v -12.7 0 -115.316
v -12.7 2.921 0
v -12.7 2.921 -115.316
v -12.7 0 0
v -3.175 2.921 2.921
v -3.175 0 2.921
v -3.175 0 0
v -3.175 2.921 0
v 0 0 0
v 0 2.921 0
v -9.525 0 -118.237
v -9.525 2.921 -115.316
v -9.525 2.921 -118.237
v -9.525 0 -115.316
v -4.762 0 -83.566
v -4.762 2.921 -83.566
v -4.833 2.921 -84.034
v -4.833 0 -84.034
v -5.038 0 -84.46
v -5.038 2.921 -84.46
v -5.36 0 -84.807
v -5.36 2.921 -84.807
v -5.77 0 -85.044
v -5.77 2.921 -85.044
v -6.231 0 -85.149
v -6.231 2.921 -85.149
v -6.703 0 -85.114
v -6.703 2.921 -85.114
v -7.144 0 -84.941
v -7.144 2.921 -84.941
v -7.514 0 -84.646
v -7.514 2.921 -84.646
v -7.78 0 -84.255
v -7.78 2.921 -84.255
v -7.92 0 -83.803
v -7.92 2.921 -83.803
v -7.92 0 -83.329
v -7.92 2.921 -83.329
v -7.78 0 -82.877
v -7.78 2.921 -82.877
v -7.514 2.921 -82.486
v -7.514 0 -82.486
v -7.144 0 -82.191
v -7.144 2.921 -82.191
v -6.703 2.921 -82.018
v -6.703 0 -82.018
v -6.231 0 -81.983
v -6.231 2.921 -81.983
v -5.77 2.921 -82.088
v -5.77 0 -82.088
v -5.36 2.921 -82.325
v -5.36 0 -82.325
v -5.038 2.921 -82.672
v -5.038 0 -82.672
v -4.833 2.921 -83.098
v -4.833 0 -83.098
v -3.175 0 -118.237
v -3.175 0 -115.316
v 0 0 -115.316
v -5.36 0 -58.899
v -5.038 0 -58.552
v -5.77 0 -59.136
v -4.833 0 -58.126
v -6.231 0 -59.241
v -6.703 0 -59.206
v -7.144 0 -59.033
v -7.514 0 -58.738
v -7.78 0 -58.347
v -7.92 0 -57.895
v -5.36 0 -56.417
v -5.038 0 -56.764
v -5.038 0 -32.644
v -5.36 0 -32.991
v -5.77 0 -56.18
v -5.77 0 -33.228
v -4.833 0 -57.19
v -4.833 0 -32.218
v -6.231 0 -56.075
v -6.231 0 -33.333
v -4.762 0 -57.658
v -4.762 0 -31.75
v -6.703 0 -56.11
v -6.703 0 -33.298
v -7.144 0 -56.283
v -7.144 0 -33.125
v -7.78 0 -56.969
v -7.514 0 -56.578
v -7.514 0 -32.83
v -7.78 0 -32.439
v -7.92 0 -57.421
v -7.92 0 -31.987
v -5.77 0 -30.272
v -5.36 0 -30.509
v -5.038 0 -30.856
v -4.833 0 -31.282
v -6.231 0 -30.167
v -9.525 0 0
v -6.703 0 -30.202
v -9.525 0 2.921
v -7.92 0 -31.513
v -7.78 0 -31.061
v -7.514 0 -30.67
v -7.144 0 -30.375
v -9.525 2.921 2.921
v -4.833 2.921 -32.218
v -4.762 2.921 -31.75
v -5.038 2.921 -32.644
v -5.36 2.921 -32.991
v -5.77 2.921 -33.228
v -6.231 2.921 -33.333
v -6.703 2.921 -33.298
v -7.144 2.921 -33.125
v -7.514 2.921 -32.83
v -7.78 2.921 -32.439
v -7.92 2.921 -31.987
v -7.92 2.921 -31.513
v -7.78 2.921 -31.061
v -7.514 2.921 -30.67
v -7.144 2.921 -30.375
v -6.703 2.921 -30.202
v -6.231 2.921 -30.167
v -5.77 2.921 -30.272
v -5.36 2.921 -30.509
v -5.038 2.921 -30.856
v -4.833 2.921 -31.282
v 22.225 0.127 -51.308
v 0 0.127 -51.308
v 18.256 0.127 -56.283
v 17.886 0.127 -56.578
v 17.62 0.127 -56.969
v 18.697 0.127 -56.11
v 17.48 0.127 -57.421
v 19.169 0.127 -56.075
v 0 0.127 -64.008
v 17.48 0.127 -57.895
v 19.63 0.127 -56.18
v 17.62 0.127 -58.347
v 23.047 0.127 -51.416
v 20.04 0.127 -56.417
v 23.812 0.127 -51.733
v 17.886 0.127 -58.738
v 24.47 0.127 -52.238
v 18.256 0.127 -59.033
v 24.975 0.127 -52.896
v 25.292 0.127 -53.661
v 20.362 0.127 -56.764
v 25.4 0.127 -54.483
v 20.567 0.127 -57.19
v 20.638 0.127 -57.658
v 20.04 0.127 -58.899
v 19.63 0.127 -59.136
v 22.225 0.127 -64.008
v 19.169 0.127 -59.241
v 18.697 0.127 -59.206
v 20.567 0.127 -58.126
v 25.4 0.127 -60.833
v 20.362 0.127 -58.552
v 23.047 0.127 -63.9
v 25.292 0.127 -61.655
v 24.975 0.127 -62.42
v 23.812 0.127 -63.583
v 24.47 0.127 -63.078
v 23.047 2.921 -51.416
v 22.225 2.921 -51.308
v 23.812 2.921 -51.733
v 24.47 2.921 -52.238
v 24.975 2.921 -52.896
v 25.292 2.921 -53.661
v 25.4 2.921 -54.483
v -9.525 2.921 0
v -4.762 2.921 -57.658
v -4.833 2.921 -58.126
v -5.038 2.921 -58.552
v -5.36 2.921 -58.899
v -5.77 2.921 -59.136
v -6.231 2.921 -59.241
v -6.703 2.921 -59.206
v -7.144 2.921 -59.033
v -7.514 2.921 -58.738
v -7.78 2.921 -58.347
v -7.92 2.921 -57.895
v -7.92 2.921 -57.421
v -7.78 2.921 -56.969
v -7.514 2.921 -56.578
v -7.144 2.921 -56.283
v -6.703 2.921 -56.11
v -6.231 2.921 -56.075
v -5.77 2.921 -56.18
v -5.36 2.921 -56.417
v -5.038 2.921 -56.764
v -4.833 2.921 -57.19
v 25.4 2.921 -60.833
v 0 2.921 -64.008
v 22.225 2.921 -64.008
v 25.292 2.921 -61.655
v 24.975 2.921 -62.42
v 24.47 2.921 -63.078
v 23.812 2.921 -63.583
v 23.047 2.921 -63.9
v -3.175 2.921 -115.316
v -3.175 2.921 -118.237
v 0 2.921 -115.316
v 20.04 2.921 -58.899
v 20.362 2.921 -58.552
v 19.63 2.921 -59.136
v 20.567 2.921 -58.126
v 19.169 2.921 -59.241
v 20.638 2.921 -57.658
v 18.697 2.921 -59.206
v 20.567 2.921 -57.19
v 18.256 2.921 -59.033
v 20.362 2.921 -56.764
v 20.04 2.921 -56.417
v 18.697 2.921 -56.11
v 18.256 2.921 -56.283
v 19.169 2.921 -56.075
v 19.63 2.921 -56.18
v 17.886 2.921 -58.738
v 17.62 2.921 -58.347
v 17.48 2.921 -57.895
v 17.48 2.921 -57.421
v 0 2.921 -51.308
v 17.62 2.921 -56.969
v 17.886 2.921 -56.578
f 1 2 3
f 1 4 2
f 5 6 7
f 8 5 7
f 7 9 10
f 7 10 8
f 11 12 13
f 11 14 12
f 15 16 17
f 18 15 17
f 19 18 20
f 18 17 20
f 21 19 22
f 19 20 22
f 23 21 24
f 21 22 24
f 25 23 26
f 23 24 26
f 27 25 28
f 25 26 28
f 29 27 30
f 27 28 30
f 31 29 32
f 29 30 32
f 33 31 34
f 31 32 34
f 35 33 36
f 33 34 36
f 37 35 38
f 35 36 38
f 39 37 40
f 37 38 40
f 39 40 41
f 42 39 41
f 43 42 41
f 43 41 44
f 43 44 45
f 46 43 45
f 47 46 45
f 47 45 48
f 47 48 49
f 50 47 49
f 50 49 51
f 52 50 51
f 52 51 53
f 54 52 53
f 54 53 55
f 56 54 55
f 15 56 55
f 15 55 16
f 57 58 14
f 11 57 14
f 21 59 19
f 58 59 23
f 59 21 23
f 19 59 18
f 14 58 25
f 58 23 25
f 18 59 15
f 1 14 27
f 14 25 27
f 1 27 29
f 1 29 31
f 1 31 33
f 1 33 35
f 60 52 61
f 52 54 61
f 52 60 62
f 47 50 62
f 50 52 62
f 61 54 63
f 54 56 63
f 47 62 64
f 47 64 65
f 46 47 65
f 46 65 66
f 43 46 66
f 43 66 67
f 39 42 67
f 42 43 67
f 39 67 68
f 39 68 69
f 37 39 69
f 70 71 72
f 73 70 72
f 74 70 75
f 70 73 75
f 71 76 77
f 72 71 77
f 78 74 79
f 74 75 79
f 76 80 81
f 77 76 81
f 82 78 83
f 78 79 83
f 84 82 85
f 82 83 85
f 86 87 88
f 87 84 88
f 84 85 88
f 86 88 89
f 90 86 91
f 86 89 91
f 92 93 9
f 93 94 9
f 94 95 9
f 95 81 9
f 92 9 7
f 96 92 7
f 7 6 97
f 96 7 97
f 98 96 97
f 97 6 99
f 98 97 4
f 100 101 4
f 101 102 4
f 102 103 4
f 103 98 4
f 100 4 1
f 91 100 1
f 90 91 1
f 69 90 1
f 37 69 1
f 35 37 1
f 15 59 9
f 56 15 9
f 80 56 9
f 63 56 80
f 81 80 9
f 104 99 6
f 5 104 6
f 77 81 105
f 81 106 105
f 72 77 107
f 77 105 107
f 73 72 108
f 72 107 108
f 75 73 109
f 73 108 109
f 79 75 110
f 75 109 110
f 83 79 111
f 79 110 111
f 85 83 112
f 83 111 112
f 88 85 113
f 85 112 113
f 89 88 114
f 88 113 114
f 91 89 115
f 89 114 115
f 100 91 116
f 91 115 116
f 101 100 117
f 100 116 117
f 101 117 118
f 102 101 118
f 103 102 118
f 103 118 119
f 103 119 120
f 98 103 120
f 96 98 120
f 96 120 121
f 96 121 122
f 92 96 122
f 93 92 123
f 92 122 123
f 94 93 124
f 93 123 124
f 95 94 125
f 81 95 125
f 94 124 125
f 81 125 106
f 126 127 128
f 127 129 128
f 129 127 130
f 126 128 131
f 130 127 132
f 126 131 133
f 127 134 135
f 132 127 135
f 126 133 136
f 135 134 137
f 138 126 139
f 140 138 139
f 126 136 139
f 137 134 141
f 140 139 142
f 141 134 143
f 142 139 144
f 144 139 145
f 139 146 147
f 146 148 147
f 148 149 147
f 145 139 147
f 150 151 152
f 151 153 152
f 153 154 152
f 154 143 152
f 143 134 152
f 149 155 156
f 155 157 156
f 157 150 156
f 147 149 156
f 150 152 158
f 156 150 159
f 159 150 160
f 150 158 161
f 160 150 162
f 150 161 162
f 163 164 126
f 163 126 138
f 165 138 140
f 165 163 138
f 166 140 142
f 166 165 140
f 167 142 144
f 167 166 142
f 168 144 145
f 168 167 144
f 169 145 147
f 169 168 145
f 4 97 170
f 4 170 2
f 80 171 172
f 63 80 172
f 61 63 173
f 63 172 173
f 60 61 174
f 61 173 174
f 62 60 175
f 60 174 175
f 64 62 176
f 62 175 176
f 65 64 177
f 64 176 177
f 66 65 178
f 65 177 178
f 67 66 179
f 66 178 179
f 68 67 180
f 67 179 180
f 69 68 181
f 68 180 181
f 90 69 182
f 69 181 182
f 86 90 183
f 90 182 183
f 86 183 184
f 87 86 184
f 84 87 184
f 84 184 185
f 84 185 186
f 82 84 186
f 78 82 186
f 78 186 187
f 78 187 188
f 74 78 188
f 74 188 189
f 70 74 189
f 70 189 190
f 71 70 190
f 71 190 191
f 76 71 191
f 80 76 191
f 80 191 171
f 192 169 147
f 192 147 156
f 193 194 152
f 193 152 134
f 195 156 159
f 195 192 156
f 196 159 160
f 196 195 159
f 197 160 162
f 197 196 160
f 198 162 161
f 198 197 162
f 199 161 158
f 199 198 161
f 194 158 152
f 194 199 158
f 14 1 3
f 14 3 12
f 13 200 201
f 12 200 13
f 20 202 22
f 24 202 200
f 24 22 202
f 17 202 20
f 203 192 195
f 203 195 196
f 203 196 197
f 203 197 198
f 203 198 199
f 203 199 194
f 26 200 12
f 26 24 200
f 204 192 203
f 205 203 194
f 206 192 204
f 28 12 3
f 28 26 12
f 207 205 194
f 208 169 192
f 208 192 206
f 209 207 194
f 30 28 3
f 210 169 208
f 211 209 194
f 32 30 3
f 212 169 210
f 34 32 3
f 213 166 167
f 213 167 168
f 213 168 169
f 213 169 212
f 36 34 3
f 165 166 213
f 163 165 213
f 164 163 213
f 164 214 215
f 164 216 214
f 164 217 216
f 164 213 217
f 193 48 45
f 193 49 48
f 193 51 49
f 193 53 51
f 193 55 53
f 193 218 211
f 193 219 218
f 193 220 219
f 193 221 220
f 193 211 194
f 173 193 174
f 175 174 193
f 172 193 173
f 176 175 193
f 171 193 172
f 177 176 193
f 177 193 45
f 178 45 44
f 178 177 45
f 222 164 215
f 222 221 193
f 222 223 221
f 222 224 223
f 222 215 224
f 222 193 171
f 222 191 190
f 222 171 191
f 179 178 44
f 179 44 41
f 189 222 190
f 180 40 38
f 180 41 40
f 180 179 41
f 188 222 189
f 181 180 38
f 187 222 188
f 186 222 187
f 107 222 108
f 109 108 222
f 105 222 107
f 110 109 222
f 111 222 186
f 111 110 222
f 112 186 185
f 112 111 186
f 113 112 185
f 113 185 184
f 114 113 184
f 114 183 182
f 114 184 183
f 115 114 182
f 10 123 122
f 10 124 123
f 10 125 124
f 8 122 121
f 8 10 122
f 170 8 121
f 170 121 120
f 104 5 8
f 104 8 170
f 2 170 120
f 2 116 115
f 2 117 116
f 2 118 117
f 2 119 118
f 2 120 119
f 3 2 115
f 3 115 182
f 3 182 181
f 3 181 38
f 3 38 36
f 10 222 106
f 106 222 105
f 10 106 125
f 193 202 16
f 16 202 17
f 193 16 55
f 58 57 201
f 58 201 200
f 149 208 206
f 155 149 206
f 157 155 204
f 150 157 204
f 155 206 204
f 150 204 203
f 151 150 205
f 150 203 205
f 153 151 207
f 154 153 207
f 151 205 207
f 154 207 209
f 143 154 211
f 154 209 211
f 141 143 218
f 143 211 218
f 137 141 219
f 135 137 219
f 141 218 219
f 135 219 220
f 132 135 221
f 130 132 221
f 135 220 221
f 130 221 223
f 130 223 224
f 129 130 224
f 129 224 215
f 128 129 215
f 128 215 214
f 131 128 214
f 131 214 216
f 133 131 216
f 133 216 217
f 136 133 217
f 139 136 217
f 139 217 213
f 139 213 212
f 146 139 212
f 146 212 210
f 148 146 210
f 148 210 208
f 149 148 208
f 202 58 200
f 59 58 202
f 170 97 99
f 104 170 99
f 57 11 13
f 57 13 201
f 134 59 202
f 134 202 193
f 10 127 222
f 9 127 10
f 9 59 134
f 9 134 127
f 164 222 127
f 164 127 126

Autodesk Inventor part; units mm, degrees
ref_plane "YZ Plane" through (0, 0, 0) normal (1, 0, 0) x (0, 1, 0)
ref_plane "XZ Plane" through (0, 0, 0) normal (0, 1, 0) x (-1, 0, 0)
ref_plane "XY Plane" through (0, 0, 0) normal (0, 0, 1) x (1, 0, 0)
sketch "Sketch1" plane through (0, 0, 0) normal (0, 1, 0) x (-1, 0, 0)
  line L0 (0, 0) -> (12.7, 0)
  line L1 (12.7, 0) -> (12.7, -115.316)
  line L2 (12.7, -115.316) -> (0, -115.316)
  line L3 (0, -115.316) -> (0, 0)
  line L4 (3.175, 0) -> (9.525, 0)
  line L5 (9.525, 0) -> (9.525, 2.921)
  line L6 (9.525, 2.921) -> (3.175, 2.921)
  line L7 (3.175, 2.921) -> (3.175, 0)
  line L8 (3.175, -115.316) -> (9.525, -115.316)
  line L9 (9.525, -115.316) -> (9.525, -118.237)
  line L10 (9.525, -118.237) -> (3.175, -118.237)
  line L11 (3.175, -118.237) -> (3.175, -115.316)
  dimension "d0" = 115.316
  dimension "d1" = 12.7
  dimension "d2" = 6.35
  dimension "d3" = 3.175
  dimension "d4" = 2.921
  dimension "d5" = 2.921
  dimension "d6" = 3.175
extrude "Extrusion1" add sketch "Sketch1" along normal blind 2.921
sketch "Sketch2" plane through (0, 2.921, 0) normal (0, 1, 0) x (1, 0, 0)
  circle A0 centre (-6.35, 31.75) radius 1.5875
  circle A1 centre (-6.35, 83.566) radius 1.5875
  line L0 (0, 0) -> (0, 115.316)
  line L1 (-3.175, 0) -> (0, 0)
  line L2 (0, 115.316) -> (-3.175, 115.316)
  dimension "d9" = 3.175
  dimension "d10" = 3.175
  dimension "d11" = 6.35
  dimension "d12" = 6.35
  dimension "d13" = 31.75
  dimension "d14" = 31.75
extrude "Extrusion2" cut sketch "Sketch2" against normal blind 2.921
sketch "Sketch3" plane through (0, 2.921, 0) normal (0, 1, 0) x (1, 0, 0)
  circle A0 centre (-6.35, 57.658) radius 1.5875
  line L0 (0, 0) -> (0, 115.316)
  line L1 (-3.175, 0) -> (0, 0)
  dimension "d17" = 3.175
  dimension "d18" = 6.35
  dimension "d19" = 57.658
extrude "Extrusion3" cut sketch "Sketch3" against normal blind 2.921
sketch "Sketch4" plane through (0, 2.921, 0) normal (0, 1, 0) x (1, 0, 0)
  line L0 (0, 51.308) -> (22.225, 51.308)
  line L1 (25.4, 54.483) -> (25.4, 60.833)
  line L2 (22.225, 64.008) -> (0, 64.008)
  line L3 (0, 64.008) -> (0, 51.308)
  circle A0 centre (-6.35, 57.658) radius 1.5875
  line L4 (0, 0) -> (0, 115.316)
  circle A1 centre (19.05, 57.658) radius 1.5875
  arc A2 (25.4, 60.833) -> (22.225, 64.008) centre (22.225, 60.833) ccw
  arc A3 (22.225, 51.308) -> (25.4, 54.483) centre (22.225, 54.483) ccw
  point P0 (25.4, 64.008)
  point P1 (25.4, 51.308)
  dimension "d22" = 6.35
  dimension "d23" = 12.7
  dimension "d24" = 25.4
  dimension "d25" = 0
  dimension "d26" = 3.175
  dimension "d27" = 25.4
  dimension "d28" = 3.175
extrude "Extrusion4" add sketch "Sketch4" against normal blind 2.794 contours L3 L2 A2 L1 A3 L0
properties part number "spoonholder"
